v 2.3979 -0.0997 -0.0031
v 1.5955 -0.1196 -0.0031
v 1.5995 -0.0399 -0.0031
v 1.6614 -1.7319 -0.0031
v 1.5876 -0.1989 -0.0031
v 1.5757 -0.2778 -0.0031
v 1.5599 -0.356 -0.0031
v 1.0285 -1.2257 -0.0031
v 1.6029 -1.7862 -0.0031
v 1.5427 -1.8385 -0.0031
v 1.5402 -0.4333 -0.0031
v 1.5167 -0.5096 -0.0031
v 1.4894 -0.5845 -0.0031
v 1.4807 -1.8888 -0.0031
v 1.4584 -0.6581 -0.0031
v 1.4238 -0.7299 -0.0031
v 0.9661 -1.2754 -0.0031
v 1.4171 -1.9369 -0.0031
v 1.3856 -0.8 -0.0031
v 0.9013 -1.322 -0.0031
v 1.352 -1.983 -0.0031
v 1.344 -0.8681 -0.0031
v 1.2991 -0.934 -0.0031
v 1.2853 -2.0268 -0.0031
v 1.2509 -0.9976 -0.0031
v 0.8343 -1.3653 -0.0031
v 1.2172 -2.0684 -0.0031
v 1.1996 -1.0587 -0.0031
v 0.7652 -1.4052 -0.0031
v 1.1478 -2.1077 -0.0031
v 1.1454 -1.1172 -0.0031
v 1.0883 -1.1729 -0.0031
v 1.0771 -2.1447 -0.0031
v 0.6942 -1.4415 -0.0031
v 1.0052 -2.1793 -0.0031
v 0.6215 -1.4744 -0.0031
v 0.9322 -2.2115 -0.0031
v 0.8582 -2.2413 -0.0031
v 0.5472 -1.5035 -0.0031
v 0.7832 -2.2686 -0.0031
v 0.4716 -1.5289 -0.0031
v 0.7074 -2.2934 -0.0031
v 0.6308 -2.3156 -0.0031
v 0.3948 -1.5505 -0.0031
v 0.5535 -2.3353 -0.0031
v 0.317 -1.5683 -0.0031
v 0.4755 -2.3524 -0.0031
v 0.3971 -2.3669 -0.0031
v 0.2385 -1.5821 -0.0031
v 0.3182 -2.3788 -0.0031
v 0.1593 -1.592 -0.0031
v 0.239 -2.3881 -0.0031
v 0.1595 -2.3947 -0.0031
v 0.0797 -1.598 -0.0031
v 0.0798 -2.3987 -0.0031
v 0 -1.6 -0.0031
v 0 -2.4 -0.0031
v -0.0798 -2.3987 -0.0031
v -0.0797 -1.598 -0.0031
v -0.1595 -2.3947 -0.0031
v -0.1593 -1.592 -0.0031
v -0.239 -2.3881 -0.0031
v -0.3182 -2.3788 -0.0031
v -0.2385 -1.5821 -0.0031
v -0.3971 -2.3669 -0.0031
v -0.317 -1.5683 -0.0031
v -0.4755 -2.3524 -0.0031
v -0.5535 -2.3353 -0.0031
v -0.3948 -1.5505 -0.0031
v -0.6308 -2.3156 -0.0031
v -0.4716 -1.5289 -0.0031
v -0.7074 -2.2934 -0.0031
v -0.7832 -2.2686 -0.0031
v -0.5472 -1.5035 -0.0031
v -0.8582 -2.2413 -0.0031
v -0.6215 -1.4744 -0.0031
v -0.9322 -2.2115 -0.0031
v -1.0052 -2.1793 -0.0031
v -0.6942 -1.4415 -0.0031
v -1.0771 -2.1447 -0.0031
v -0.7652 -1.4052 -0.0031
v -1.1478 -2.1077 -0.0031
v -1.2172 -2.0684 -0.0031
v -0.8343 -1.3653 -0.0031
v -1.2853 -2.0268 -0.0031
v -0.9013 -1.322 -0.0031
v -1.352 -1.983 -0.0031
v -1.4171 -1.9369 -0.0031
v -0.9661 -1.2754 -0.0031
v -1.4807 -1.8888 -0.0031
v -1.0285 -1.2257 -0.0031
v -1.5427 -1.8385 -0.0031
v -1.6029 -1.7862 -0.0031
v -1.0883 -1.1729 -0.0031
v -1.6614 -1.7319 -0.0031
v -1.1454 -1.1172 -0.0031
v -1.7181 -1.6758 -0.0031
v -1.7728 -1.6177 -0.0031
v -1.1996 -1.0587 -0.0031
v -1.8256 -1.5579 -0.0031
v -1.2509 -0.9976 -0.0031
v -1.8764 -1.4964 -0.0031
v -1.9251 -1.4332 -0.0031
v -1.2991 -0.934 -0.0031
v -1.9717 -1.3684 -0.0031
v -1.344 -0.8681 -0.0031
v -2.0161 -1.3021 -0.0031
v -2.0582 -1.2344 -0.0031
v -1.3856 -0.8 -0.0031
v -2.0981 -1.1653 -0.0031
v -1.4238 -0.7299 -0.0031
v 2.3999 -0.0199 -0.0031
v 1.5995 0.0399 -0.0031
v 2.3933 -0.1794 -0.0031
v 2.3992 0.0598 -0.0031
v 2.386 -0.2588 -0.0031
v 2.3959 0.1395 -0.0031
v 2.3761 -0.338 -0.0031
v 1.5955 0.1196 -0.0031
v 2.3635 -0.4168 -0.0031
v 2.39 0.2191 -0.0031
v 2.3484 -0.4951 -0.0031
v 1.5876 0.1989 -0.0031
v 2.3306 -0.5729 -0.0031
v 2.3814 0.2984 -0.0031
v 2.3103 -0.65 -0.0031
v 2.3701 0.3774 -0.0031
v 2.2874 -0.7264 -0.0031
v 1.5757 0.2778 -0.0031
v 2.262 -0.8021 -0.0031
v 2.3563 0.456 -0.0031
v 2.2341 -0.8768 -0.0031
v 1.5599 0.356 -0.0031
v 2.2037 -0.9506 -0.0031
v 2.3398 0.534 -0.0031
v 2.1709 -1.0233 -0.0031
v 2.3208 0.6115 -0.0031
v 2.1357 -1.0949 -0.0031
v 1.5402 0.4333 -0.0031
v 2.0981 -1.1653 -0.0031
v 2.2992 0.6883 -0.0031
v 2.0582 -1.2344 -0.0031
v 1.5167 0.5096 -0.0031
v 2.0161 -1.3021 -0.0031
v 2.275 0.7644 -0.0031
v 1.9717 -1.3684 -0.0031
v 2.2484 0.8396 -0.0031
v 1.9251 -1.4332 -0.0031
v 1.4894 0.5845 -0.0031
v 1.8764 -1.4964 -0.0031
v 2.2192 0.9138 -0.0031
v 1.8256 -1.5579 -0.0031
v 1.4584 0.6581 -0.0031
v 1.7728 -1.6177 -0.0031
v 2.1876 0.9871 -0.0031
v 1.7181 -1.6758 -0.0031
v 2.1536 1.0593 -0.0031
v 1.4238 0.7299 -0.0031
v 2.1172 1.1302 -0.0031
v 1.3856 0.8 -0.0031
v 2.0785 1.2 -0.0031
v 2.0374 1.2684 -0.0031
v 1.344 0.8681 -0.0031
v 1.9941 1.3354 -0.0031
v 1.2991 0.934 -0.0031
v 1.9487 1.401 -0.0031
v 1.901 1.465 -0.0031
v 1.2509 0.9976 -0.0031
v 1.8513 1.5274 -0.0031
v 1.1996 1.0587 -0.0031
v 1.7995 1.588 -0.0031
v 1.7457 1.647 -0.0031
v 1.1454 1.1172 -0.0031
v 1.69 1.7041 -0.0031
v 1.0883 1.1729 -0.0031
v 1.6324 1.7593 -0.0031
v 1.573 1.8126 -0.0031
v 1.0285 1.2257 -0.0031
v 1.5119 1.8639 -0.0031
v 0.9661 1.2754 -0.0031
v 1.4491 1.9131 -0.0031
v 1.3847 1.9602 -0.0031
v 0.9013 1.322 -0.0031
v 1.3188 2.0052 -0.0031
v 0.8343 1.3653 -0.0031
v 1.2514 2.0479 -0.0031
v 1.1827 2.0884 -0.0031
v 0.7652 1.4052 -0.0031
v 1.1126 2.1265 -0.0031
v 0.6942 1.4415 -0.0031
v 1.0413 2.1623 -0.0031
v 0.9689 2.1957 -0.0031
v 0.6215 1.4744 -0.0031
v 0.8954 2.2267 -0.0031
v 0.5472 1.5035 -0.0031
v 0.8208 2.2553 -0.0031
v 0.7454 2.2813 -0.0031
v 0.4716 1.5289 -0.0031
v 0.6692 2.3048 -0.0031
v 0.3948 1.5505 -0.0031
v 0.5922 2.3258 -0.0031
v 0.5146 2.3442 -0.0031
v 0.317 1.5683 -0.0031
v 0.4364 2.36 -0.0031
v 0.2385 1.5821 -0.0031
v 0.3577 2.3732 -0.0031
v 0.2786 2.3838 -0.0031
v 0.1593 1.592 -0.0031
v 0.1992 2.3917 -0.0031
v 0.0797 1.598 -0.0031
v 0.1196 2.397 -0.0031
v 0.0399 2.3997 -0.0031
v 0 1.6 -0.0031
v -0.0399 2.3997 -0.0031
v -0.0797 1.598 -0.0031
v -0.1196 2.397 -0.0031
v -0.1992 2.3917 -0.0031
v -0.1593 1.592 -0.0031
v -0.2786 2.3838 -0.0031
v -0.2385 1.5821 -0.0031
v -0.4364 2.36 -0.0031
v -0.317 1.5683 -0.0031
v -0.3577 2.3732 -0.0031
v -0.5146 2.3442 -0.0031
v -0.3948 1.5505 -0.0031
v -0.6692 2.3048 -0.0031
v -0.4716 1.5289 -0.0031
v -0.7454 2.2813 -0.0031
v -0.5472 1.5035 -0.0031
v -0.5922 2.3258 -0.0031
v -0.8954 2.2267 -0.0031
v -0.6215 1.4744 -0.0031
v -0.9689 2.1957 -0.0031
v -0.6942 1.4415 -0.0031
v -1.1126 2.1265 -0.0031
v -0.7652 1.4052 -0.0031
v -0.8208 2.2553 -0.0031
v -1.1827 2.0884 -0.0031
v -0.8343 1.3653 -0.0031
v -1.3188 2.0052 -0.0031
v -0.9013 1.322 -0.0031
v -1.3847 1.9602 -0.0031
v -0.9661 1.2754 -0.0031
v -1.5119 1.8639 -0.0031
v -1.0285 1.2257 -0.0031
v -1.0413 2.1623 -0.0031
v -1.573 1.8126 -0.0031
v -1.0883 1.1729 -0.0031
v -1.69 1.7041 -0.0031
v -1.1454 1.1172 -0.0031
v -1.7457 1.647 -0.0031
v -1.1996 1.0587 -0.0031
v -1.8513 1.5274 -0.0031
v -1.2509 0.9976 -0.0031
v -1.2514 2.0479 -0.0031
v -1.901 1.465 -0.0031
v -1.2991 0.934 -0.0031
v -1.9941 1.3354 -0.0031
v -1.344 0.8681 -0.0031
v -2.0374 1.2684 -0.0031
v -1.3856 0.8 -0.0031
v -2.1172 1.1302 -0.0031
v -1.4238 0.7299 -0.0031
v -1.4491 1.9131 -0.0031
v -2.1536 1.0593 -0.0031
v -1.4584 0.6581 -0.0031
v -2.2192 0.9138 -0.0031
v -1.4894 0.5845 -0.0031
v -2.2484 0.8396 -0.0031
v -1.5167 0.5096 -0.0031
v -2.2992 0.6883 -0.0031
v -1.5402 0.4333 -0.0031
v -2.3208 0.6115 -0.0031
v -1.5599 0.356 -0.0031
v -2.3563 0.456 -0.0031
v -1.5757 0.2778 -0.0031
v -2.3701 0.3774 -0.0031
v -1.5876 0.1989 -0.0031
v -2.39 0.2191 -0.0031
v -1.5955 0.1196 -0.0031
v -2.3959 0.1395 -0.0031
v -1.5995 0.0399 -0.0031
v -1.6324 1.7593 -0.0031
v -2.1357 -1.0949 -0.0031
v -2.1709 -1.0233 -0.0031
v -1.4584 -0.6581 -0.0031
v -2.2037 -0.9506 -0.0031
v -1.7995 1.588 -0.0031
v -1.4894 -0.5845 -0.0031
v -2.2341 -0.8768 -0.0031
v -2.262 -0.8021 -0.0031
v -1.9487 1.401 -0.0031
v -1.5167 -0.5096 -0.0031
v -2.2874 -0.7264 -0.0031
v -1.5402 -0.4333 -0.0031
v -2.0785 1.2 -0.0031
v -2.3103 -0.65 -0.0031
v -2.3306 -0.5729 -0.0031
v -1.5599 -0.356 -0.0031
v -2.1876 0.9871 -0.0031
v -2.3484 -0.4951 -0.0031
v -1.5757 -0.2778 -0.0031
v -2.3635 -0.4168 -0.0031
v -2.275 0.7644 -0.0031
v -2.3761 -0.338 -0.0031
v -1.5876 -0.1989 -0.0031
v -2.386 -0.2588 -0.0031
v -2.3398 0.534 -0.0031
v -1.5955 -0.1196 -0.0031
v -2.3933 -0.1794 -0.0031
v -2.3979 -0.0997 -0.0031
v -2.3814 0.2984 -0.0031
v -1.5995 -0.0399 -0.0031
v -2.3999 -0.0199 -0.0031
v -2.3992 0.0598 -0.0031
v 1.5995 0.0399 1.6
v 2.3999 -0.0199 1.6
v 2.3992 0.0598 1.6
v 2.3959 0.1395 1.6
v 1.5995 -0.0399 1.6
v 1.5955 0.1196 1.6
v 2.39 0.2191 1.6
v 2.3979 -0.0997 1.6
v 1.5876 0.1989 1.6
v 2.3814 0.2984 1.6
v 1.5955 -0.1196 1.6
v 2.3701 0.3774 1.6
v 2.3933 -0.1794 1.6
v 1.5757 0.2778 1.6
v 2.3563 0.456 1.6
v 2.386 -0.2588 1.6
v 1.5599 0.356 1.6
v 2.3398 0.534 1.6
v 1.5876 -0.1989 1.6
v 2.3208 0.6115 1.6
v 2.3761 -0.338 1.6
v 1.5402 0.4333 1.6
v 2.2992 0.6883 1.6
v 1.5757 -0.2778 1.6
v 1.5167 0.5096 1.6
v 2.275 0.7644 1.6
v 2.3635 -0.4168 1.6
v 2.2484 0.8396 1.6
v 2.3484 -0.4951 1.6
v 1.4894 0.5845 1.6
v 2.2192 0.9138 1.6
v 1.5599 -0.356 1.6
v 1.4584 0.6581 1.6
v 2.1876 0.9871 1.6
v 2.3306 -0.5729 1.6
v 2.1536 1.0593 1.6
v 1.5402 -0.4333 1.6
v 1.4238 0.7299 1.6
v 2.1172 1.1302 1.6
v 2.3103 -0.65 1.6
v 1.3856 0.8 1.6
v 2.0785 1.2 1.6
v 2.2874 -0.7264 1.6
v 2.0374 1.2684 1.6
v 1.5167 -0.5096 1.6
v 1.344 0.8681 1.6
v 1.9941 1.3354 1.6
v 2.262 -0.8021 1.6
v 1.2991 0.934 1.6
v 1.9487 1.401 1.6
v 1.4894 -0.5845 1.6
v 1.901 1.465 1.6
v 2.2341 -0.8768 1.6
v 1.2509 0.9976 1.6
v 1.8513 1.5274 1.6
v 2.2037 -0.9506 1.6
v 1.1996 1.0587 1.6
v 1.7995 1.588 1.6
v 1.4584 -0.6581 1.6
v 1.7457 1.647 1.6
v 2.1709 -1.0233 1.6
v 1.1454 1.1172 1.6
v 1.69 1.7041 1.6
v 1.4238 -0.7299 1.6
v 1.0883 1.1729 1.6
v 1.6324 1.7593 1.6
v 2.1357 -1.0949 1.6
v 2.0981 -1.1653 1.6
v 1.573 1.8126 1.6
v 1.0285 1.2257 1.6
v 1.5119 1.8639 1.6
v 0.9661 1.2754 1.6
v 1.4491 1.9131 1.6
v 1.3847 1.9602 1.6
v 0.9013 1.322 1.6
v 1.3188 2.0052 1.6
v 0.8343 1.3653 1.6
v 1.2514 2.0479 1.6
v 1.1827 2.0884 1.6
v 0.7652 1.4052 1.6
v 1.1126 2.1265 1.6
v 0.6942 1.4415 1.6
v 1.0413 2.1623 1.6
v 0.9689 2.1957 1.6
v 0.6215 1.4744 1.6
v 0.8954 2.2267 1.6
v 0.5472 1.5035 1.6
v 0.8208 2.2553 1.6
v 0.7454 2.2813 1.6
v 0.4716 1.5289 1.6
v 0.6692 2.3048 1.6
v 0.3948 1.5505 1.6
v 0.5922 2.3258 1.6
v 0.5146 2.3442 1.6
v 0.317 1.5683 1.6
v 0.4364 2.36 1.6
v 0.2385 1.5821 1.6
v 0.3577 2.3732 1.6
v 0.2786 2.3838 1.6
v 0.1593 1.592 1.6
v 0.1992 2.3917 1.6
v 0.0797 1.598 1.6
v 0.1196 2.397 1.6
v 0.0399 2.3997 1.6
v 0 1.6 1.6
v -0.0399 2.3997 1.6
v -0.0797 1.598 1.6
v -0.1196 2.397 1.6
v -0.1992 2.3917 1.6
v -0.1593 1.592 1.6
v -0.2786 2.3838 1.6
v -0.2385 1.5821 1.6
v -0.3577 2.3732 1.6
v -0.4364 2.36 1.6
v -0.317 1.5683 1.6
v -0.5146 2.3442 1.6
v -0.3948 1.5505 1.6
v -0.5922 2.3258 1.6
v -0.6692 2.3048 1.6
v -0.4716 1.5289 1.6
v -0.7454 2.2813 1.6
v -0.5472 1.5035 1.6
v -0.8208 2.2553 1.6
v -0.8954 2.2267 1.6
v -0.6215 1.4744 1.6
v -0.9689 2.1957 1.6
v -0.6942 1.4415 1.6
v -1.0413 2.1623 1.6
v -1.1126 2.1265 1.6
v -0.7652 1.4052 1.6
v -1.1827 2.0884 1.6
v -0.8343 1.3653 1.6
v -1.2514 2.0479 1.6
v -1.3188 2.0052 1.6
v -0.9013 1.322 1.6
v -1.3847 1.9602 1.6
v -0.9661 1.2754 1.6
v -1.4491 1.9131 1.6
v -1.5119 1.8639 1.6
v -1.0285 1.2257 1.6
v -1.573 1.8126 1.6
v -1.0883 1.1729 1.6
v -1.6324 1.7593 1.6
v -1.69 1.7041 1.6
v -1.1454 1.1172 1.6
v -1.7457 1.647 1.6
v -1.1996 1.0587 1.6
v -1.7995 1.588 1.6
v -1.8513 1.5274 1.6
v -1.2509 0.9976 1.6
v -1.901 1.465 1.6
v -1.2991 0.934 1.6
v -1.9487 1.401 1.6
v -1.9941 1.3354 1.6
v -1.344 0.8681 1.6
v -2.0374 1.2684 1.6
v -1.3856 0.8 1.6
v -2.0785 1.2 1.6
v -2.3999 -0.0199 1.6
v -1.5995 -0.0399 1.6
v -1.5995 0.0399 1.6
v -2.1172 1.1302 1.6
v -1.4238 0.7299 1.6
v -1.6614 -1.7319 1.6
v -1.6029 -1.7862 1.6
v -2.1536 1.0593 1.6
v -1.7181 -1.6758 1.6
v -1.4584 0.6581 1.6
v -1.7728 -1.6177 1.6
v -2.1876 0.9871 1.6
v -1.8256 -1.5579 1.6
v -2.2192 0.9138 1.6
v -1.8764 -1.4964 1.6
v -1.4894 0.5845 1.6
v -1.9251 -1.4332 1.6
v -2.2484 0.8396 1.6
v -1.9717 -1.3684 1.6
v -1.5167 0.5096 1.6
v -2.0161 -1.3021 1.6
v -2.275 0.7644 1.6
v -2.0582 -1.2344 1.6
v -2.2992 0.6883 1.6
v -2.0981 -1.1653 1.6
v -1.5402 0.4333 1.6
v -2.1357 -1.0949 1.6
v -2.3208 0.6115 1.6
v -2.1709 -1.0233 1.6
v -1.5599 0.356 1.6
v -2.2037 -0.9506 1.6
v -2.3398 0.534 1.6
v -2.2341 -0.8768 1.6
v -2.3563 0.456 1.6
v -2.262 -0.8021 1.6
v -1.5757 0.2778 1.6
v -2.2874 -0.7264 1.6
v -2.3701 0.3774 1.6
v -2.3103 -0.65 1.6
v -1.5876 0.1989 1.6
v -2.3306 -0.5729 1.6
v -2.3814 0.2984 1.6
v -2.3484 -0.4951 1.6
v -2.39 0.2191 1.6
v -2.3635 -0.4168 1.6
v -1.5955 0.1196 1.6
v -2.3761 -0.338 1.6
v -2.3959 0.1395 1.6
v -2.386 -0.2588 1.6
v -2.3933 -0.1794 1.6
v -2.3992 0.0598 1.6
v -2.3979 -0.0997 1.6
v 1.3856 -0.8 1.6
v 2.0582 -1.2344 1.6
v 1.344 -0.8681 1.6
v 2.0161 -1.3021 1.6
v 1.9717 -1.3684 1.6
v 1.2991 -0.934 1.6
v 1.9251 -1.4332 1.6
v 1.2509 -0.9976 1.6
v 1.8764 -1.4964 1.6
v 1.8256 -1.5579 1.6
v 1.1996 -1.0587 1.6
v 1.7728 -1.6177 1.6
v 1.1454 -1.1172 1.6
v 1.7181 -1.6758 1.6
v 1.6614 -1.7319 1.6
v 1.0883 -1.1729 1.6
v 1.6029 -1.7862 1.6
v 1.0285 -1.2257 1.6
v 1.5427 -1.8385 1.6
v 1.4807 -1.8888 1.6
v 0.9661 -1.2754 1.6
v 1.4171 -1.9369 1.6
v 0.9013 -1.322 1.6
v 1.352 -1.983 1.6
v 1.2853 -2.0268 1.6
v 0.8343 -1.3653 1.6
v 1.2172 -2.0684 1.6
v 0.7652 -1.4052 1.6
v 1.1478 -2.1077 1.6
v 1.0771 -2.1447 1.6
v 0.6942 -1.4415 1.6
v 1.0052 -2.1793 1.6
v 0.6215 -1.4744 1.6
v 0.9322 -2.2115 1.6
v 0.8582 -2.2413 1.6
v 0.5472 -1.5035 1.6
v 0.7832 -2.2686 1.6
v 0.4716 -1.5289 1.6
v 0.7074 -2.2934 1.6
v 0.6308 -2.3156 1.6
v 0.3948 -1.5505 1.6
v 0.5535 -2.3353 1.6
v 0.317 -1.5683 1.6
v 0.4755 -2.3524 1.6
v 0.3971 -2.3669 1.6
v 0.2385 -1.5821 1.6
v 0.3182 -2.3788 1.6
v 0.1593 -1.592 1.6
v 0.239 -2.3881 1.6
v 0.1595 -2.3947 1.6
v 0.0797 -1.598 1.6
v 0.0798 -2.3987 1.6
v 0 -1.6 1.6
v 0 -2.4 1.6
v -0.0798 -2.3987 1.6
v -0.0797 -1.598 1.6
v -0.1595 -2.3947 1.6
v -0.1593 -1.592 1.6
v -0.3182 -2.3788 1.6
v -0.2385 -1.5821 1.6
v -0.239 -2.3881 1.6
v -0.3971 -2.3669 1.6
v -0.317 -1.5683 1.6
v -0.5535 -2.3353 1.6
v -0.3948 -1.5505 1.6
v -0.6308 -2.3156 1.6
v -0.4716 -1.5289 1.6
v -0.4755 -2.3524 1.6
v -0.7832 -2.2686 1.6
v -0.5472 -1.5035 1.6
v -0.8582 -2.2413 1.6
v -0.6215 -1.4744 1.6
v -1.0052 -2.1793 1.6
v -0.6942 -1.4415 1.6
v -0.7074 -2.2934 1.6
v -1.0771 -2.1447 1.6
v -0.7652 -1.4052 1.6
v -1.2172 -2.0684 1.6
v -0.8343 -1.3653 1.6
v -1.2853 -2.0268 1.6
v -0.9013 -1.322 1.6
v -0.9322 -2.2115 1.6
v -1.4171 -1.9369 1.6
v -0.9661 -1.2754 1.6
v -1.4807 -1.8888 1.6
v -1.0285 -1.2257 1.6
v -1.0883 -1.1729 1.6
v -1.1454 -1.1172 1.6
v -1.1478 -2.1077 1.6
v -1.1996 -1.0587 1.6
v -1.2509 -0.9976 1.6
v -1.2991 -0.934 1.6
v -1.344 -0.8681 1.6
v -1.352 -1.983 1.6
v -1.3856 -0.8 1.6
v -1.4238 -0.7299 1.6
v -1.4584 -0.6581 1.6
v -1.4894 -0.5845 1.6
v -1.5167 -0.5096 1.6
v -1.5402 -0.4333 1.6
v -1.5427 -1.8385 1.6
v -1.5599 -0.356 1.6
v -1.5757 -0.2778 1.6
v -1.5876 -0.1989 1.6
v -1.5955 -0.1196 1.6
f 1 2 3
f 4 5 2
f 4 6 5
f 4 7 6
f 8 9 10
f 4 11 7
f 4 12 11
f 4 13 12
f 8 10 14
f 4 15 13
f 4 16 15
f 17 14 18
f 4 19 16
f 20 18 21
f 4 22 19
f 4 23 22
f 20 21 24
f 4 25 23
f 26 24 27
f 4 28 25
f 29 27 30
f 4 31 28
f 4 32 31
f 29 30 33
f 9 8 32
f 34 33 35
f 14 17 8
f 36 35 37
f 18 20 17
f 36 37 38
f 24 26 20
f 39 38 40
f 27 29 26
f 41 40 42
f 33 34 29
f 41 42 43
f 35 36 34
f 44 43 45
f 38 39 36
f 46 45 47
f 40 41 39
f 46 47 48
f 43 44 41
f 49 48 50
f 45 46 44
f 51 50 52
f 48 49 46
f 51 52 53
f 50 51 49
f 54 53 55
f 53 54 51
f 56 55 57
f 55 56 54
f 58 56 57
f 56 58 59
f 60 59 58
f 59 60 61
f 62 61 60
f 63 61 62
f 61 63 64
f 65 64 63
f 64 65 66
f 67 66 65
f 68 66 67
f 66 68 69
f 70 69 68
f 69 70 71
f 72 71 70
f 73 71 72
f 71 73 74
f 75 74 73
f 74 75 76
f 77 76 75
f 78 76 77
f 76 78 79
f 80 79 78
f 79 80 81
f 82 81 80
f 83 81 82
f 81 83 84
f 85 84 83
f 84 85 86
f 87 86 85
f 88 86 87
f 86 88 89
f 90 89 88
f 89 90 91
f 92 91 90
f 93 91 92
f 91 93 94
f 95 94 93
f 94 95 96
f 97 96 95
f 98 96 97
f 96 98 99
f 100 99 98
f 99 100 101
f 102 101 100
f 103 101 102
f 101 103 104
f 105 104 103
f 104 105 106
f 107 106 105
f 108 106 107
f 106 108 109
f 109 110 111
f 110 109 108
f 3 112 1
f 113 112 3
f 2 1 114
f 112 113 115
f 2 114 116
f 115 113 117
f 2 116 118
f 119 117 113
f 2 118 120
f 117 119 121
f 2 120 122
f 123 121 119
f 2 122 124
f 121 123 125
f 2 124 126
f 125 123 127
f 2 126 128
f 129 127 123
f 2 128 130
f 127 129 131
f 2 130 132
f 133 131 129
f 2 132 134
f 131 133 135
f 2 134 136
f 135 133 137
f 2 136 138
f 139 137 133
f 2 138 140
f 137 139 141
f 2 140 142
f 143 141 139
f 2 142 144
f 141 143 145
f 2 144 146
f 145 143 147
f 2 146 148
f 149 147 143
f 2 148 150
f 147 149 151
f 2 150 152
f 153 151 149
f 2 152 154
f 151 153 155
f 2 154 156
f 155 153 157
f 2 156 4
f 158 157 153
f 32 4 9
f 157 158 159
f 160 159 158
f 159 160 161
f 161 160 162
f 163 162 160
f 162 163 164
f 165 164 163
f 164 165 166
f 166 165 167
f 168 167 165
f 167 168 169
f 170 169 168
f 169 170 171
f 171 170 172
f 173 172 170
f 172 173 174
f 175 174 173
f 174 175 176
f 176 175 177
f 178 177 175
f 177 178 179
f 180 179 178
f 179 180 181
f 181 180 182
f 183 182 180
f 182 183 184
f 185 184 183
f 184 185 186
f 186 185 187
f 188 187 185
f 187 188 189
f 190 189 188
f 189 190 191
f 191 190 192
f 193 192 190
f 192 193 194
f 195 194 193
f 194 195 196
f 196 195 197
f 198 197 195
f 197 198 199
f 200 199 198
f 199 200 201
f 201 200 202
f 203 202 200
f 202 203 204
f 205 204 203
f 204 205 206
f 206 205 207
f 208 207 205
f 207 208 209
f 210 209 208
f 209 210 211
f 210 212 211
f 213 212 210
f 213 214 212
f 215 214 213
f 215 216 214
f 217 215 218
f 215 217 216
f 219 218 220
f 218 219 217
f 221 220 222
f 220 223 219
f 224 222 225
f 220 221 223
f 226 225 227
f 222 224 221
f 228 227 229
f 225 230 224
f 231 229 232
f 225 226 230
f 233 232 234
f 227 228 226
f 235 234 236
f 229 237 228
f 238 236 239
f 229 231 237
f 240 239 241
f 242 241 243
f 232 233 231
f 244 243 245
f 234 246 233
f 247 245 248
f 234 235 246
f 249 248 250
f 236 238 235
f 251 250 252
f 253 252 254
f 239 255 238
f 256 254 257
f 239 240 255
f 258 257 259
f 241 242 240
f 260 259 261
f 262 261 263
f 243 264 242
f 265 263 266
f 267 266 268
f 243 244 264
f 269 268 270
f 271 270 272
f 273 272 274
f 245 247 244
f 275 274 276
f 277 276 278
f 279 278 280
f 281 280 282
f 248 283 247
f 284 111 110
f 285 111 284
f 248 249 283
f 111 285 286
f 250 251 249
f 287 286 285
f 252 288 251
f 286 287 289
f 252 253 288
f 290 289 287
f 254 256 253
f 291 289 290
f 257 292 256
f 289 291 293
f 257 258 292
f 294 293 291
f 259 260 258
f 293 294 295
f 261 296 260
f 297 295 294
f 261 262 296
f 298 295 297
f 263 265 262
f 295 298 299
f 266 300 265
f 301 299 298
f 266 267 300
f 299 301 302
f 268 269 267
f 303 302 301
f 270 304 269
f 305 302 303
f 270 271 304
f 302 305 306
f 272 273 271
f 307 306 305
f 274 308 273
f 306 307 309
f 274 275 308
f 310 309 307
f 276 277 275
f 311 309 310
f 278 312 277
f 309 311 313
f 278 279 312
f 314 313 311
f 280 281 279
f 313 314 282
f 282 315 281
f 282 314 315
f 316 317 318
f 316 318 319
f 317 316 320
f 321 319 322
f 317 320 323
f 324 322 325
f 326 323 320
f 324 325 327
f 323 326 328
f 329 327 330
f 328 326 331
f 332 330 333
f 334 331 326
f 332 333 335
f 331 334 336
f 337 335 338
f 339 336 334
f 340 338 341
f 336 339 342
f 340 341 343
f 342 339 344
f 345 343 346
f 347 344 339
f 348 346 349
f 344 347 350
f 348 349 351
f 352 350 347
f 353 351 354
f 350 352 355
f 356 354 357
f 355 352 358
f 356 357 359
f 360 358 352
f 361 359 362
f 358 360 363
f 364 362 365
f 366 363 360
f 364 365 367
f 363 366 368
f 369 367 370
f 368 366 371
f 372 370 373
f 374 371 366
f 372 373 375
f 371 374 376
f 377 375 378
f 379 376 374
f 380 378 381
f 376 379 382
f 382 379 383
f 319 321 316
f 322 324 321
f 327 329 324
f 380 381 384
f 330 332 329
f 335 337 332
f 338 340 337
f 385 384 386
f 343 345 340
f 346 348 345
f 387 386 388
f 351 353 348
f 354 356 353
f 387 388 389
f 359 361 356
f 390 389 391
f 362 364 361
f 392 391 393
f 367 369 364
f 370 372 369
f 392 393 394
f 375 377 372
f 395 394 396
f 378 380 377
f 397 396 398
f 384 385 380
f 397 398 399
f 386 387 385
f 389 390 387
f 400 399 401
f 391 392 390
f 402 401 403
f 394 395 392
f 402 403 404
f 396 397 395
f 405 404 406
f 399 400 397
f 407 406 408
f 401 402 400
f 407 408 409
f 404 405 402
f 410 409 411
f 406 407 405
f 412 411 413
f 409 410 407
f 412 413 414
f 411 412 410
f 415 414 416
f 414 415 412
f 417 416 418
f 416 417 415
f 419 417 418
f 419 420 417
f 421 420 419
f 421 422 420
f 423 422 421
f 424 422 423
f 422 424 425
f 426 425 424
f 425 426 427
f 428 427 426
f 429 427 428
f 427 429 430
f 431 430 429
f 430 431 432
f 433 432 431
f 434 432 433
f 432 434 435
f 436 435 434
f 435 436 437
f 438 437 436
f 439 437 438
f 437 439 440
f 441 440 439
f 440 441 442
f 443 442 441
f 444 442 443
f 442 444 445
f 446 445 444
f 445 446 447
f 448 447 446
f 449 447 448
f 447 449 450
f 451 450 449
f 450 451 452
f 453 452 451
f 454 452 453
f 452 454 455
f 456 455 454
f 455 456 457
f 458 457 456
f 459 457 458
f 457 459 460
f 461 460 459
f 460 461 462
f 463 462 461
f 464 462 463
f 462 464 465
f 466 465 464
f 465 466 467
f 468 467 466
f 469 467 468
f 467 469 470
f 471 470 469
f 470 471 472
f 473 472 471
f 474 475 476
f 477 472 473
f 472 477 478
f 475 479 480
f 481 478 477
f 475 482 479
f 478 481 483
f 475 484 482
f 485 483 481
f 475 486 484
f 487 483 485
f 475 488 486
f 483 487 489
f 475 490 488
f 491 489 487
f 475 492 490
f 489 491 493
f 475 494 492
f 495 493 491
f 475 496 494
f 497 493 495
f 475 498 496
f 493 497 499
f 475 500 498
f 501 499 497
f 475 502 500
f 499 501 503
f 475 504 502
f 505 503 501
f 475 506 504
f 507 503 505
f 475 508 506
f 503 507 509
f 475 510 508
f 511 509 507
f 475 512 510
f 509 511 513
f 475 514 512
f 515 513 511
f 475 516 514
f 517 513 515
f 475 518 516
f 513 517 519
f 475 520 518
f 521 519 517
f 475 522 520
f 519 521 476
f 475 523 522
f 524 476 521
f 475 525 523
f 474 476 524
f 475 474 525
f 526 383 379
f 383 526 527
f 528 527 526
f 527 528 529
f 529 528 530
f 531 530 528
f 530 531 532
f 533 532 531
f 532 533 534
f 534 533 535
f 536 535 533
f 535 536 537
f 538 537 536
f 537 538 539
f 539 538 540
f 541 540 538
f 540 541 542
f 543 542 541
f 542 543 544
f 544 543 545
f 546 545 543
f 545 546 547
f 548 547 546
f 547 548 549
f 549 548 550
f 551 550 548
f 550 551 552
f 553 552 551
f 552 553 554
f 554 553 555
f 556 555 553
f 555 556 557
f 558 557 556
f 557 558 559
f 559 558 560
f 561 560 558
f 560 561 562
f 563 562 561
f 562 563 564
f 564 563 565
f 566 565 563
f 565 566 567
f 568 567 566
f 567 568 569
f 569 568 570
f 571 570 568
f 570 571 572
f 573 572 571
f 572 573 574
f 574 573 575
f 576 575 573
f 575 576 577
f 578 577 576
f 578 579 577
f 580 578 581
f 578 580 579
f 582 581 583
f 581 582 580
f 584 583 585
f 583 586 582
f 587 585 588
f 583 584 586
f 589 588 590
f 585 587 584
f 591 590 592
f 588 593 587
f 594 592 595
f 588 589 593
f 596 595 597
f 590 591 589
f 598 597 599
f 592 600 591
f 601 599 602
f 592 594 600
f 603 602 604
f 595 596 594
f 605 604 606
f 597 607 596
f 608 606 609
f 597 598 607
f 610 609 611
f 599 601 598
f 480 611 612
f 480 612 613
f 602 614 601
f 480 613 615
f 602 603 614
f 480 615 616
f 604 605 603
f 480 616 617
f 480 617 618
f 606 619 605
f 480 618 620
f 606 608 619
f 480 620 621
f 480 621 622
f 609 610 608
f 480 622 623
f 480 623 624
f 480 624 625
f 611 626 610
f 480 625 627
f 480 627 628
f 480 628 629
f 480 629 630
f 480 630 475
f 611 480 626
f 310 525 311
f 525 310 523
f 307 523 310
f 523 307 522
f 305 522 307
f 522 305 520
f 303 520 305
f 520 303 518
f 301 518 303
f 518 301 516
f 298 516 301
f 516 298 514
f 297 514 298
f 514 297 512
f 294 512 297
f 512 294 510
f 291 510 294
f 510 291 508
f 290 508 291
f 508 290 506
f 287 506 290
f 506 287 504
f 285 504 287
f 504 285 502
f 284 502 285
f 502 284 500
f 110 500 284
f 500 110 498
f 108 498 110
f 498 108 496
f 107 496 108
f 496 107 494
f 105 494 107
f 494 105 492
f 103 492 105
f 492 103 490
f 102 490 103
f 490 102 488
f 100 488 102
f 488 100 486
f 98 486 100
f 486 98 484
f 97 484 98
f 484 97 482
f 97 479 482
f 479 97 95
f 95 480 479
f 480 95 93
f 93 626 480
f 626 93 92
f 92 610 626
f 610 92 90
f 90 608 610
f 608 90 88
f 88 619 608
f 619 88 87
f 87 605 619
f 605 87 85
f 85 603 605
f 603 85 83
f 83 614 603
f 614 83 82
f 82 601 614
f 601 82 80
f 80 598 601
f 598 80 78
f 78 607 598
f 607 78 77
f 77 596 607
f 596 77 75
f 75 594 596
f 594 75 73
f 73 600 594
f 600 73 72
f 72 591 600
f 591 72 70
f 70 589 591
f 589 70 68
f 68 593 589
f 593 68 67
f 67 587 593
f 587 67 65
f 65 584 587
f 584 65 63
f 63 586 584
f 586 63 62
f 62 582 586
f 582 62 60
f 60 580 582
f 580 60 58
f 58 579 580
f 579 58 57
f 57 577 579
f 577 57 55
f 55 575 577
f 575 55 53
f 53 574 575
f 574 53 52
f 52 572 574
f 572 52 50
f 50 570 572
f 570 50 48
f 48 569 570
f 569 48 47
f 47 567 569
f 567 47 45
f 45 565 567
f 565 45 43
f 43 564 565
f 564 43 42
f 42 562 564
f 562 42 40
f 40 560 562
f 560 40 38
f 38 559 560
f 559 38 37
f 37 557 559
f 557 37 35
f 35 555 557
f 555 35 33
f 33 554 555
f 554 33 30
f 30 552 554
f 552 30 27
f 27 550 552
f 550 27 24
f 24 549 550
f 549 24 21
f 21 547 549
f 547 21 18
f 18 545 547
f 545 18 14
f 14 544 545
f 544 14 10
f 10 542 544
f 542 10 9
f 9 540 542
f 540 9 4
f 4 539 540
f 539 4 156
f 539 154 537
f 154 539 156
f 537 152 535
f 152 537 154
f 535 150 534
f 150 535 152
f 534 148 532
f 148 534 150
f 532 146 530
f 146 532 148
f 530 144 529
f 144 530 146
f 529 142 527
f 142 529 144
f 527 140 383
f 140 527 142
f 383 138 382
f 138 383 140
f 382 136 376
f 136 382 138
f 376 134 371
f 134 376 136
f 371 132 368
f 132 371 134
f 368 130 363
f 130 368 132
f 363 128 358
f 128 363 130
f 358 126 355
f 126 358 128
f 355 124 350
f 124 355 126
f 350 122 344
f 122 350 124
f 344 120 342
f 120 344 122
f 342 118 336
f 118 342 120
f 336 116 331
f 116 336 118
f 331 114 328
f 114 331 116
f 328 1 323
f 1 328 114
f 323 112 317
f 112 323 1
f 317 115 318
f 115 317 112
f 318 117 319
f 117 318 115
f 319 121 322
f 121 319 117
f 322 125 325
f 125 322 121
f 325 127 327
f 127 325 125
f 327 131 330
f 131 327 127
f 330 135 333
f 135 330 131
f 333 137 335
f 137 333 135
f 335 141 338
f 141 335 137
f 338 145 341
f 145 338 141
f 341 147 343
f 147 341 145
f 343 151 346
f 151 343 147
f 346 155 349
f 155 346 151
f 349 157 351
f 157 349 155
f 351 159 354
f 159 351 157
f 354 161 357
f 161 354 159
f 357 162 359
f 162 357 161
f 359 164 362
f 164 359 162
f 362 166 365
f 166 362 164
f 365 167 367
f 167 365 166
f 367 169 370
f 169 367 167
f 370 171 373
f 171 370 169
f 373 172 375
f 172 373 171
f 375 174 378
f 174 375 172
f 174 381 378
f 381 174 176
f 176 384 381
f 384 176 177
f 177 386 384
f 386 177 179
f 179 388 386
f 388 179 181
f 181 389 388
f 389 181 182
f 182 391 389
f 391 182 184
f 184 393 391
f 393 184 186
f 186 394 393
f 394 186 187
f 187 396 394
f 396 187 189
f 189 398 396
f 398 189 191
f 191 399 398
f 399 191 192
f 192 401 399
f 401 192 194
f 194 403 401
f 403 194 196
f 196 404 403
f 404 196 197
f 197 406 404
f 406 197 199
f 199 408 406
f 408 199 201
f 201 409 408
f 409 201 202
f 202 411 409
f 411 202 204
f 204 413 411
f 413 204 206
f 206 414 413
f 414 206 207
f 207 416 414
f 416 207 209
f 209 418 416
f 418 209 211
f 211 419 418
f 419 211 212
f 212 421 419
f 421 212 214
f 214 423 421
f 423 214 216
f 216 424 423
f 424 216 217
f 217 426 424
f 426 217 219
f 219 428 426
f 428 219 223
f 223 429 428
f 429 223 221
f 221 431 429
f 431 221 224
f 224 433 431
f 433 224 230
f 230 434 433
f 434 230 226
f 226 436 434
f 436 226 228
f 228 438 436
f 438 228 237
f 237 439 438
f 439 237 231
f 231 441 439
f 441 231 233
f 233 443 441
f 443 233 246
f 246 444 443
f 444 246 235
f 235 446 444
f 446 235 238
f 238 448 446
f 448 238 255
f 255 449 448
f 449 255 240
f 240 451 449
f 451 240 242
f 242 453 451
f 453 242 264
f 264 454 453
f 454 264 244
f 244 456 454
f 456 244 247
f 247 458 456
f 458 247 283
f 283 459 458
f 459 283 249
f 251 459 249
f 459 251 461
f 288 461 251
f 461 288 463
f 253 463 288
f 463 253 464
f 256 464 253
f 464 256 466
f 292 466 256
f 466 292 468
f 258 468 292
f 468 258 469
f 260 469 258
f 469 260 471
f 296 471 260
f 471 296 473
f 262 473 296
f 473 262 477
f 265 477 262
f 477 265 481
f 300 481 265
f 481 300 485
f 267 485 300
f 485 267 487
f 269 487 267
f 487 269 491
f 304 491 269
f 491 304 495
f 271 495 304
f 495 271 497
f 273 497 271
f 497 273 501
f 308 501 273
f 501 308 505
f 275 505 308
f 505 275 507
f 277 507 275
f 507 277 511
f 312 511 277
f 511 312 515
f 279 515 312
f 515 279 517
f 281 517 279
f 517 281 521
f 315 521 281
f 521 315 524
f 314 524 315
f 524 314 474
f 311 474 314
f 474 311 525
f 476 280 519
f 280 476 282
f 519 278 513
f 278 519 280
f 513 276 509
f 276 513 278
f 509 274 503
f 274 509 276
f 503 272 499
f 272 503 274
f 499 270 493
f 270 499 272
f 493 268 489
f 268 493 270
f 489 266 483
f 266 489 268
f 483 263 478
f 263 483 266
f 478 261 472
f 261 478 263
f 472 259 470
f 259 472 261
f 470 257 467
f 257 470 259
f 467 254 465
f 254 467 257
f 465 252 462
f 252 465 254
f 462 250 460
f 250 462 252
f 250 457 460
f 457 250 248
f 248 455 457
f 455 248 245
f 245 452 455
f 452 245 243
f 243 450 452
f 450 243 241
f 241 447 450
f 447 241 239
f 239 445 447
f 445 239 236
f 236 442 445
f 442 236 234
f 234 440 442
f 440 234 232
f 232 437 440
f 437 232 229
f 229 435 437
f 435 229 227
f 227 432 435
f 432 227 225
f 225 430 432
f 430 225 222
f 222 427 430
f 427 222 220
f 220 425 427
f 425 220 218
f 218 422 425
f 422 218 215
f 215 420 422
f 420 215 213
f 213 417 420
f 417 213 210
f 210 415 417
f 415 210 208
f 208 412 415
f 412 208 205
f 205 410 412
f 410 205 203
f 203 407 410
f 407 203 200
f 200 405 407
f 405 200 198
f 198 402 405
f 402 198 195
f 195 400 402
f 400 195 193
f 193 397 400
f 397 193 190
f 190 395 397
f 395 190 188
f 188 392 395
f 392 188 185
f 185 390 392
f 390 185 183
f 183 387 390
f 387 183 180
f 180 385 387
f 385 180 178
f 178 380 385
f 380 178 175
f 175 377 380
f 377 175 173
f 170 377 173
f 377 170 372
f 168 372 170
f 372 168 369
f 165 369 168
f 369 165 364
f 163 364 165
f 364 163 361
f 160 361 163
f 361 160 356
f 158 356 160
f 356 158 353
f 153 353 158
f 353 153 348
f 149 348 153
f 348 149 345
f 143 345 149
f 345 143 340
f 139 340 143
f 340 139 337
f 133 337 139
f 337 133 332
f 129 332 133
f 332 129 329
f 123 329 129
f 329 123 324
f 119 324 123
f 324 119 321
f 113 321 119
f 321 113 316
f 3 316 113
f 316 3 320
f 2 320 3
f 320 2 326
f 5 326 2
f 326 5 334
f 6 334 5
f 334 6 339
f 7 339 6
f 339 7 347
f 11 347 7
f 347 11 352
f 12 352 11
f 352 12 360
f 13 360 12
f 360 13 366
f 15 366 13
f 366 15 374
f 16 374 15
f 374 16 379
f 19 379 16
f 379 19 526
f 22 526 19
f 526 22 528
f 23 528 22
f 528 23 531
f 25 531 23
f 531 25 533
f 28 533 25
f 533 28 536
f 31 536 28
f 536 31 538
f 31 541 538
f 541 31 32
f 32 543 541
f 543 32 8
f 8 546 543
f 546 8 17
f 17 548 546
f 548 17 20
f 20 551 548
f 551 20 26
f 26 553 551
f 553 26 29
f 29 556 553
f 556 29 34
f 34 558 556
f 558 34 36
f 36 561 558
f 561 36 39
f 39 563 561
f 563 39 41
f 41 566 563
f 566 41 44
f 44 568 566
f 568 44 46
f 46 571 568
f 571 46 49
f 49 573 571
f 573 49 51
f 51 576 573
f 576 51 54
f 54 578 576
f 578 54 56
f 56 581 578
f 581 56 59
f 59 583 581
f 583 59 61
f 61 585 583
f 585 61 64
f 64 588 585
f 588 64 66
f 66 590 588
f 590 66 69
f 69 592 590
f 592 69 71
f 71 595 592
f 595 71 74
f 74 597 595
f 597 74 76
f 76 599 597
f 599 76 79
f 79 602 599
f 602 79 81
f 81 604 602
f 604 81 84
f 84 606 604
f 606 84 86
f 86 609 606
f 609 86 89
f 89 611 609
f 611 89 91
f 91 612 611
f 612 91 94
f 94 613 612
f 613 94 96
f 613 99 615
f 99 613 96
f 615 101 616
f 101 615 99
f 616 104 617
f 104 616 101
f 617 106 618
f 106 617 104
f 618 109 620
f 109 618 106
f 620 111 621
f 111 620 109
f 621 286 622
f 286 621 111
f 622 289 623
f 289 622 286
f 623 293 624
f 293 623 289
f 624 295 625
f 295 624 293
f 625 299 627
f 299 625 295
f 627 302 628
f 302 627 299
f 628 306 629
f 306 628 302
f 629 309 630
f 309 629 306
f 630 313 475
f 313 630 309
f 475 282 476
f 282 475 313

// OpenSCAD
use <../lib.scad>
use <../p/4-4cyli.scad>
use <../p/4-4disc.scad>
use <../p/4-4edge.scad>
use <../p/h2.scad>
use <../p/stud2.scad>
use <../p/t04o3333.scad>
$fa=1; $fs=0.2;
function ldraw_lib__2433(realsolid=false) = [
// 0 Hinge Bar  2 with 3 Fingers and Top Stud
// 0 Name: 2433.dat
// 0 Author: James Jessiman
// 0 !LDRAW_ORG Part UPDATE 2004-04
// 0 !LICENSE Licensed under CC BY 2.0 and CC BY 4.0 : see CAreadme.txt
// 
// 0 BFC CERTIFY CCW
  [0,"BFC","CERTIFY"],
  [0,"BFC","CCW"],
// 
// 0 !KEYWORDS control, controls, finger, gear shift, lever, rod, rod system
// 
// 0 !HISTORY 1998-06-20 [PTadmin] Official Update 1998-06
// 0 !HISTORY 2003-06-08 [jriley] BFC compliant
// 0 !HISTORY 2003-11-20 [OrionP] added ridges; fixed L3P errors
// 0 !HISTORY 2003-11-20 [fwcain] added some keywords...
// 0 !HISTORY 2004-11-06 [PTadmin] Official Update 2004-04
// 0 !HISTORY 2007-05-08 [PTadmin] Header formatted for Contributor Agreement
// 0 !HISTORY 2008-07-01 [PTadmin] Official Update 2008-01
// 
// 
// 1 16 0 0 0 1 0 0 0 1 0 0 0 1 stud2.dat
  [1,16,0,0,0,1,0,0,0,1,0,0,0,1, ldraw_lib__stud2(realsolid)],
// 1 16 0 26 0 1 0 0 0 1 0 0 0 1 h2.dat
  [1,16,0,26,0,1,0,0,0,1,0,0,0,1, ldraw_lib__h2(realsolid)],
// 2 24 4 26 10 -4 26 10
  [2,24,4,26,10,-4,26,10],
// 2 24 -4 26 10 -4 26 -10
  [2,24,-4,26,10,-4,26,-10],
// 2 24 -4 26 -10 4 26 -10
  [2,24,-4,26,-10,4,26,-10],
// 2 24 4 26 -10 4 26 10
  [2,24,4,26,-10,4,26,10],
// 1 16 0 26 0 4 0 0 0 1 0 0 0 4 4-4edge.dat
  [1,16,0,26,0,4,0,0,0,1,0,0,0,4, ldraw_lib__4_4edge(realsolid)],
// 1 16 0 4 0 4 0 0 0 1 0 0 0 4 4-4edge.dat
  [1,16,0,4,0,4,0,0,0,1,0,0,0,4, ldraw_lib__4_4edge(realsolid)],
// 1 16 0 4 0 8 0 0 0 1 0 0 0 8 4-4edge.dat
  [1,16,0,4,0,8,0,0,0,1,0,0,0,8, ldraw_lib__4_4edge(realsolid)],
// 1 16 0 0 0 8 0 0 0 1 0 0 0 8 4-4edge.dat
  [1,16,0,0,0,8,0,0,0,1,0,0,0,8, ldraw_lib__4_4edge(realsolid)],
// 4 16 4 26 -10 4 26 10 -4 26 10 -4 26 -10
  [4,16,4,26,-10,4,26,10,-4,26,10,-4,26,-10],
// 1 16 0 4 0 4 0 0 0 8 0 0 0 4 4-4cyli.dat
  [1,16,0,4,0,4,0,0,0,8,0,0,0,4, ldraw_lib__4_4cyli(realsolid)],
// 1 16 0 20 0 4 0 0 0 6 0 0 0 4 4-4cyli.dat
  [1,16,0,20,0,4,0,0,0,6,0,0,0,4, ldraw_lib__4_4cyli(realsolid)],
// 1 16 0 4 0 8 0 0 0 -1 0 0 0 -8 4-4disc.dat
  [1,16,0,4,0,8,0,0,0,-1,0,0,0,-8, ldraw_lib__4_4disc(realsolid)],
// 1 16 0 0 0 8 0 0 0 4 0 0 0 8 4-4cyli.dat
  [1,16,0,0,0,8,0,0,0,4,0,0,0,8, ldraw_lib__4_4cyli(realsolid)],
// 1 16 0 0 0 8 0 0 0 1 0 0 0 8 4-4disc.dat
  [1,16,0,0,0,8,0,0,0,1,0,0,0,8, ldraw_lib__4_4disc(realsolid)],
// 1 16 0 12 0 3 0 0 0 3 0 0 0 -3 t04o3333.dat
  [1,16,0,12,0,3,0,0,0,3,0,0,0,-3, ldraw_lib__t04o3333(realsolid)],
// 1 16 0 12 0 0 0 3 0 3 0 3 0 0 t04o3333.dat
  [1,16,0,12,0,0,0,3,0,3,0,3,0,0, ldraw_lib__t04o3333(realsolid)],
// 1 16 0 12 0 -3 0 0 0 3 0 0 0 3 t04o3333.dat
  [1,16,0,12,0,-3,0,0,0,3,0,0,0,3, ldraw_lib__t04o3333(realsolid)],
// 1 16 0 12 0 0 0 -3 0 3 0 -3 0 0 t04o3333.dat
  [1,16,0,12,0,0,0,-3,0,3,0,-3,0,0, ldraw_lib__t04o3333(realsolid)],
// 1 16 0 14 0 -3 0 0 0 -3 0 0 0 -3 t04o3333.dat
  [1,16,0,14,0,-3,0,0,0,-3,0,0,0,-3, ldraw_lib__t04o3333(realsolid)],
// 1 16 0 14 0 0 0 -3 0 -3 0 3 0 0 t04o3333.dat
  [1,16,0,14,0,0,0,-3,0,-3,0,3,0,0, ldraw_lib__t04o3333(realsolid)],
// 1 16 0 14 0 3 0 0 0 -3 0 0 0 3 t04o3333.dat
  [1,16,0,14,0,3,0,0,0,-3,0,0,0,3, ldraw_lib__t04o3333(realsolid)],
// 1 16 0 14 0 0 0 3 0 -3 0 -3 0 0 t04o3333.dat
  [1,16,0,14,0,0,0,3,0,-3,0,-3,0,0, ldraw_lib__t04o3333(realsolid)],
// 1 16 0 13 0 3 0 0 0 1 0 0 0 -3 4-4edge.dat
  [1,16,0,13,0,3,0,0,0,1,0,0,0,-3, ldraw_lib__4_4edge(realsolid)],
// 1 16 0 14 0 3 0 0 0 3 0 0 0 -3 t04o3333.dat
  [1,16,0,14,0,3,0,0,0,3,0,0,0,-3, ldraw_lib__t04o3333(realsolid)],
// 1 16 0 14 0 0 0 3 0 3 0 3 0 0 t04o3333.dat
  [1,16,0,14,0,0,0,3,0,3,0,3,0,0, ldraw_lib__t04o3333(realsolid)],
// 1 16 0 14 0 -3 0 0 0 3 0 0 0 3 t04o3333.dat
  [1,16,0,14,0,-3,0,0,0,3,0,0,0,3, ldraw_lib__t04o3333(realsolid)],
// 1 16 0 14 0 0 0 -3 0 3 0 -3 0 0 t04o3333.dat
  [1,16,0,14,0,0,0,-3,0,3,0,-3,0,0, ldraw_lib__t04o3333(realsolid)],
// 1 16 0 16 0 -3 0 0 0 -3 0 0 0 -3 t04o3333.dat
  [1,16,0,16,0,-3,0,0,0,-3,0,0,0,-3, ldraw_lib__t04o3333(realsolid)],
// 1 16 0 16 0 0 0 -3 0 -3 0 3 0 0 t04o3333.dat
  [1,16,0,16,0,0,0,-3,0,-3,0,3,0,0, ldraw_lib__t04o3333(realsolid)],
// 1 16 0 16 0 3 0 0 0 -3 0 0 0 3 t04o3333.dat
  [1,16,0,16,0,3,0,0,0,-3,0,0,0,3, ldraw_lib__t04o3333(realsolid)],
// 1 16 0 16 0 0 0 3 0 -3 0 -3 0 0 t04o3333.dat
  [1,16,0,16,0,0,0,3,0,-3,0,-3,0,0, ldraw_lib__t04o3333(realsolid)],
// 1 16 0 15 0 3 0 0 0 1 0 0 0 -3 4-4edge.dat
  [1,16,0,15,0,3,0,0,0,1,0,0,0,-3, ldraw_lib__4_4edge(realsolid)],
// 1 16 0 16 0 3 0 0 0 3 0 0 0 -3 t04o3333.dat
  [1,16,0,16,0,3,0,0,0,3,0,0,0,-3, ldraw_lib__t04o3333(realsolid)],
// 1 16 0 16 0 0 0 3 0 3 0 3 0 0 t04o3333.dat
  [1,16,0,16,0,0,0,3,0,3,0,3,0,0, ldraw_lib__t04o3333(realsolid)],
// 1 16 0 16 0 -3 0 0 0 3 0 0 0 3 t04o3333.dat
  [1,16,0,16,0,-3,0,0,0,3,0,0,0,3, ldraw_lib__t04o3333(realsolid)],
// 1 16 0 16 0 0 0 -3 0 3 0 -3 0 0 t04o3333.dat
  [1,16,0,16,0,0,0,-3,0,3,0,-3,0,0, ldraw_lib__t04o3333(realsolid)],
// 1 16 0 18 0 -3 0 0 0 -3 0 0 0 -3 t04o3333.dat
  [1,16,0,18,0,-3,0,0,0,-3,0,0,0,-3, ldraw_lib__t04o3333(realsolid)],
// 1 16 0 18 0 0 0 -3 0 -3 0 3 0 0 t04o3333.dat
  [1,16,0,18,0,0,0,-3,0,-3,0,3,0,0, ldraw_lib__t04o3333(realsolid)],
// 1 16 0 18 0 3 0 0 0 -3 0 0 0 3 t04o3333.dat
  [1,16,0,18,0,3,0,0,0,-3,0,0,0,3, ldraw_lib__t04o3333(realsolid)],
// 1 16 0 18 0 0 0 3 0 -3 0 -3 0 0 t04o3333.dat
  [1,16,0,18,0,0,0,3,0,-3,0,-3,0,0, ldraw_lib__t04o3333(realsolid)],
// 1 16 0 17 0 3 0 0 0 1 0 0 0 -3 4-4edge.dat
  [1,16,0,17,0,3,0,0,0,1,0,0,0,-3, ldraw_lib__4_4edge(realsolid)],
// 1 16 0 18 0 3 0 0 0 3 0 0 0 -3 t04o3333.dat
  [1,16,0,18,0,3,0,0,0,3,0,0,0,-3, ldraw_lib__t04o3333(realsolid)],
// 1 16 0 18 0 0 0 3 0 3 0 3 0 0 t04o3333.dat
  [1,16,0,18,0,0,0,3,0,3,0,3,0,0, ldraw_lib__t04o3333(realsolid)],
// 1 16 0 18 0 -3 0 0 0 3 0 0 0 3 t04o3333.dat
  [1,16,0,18,0,-3,0,0,0,3,0,0,0,3, ldraw_lib__t04o3333(realsolid)],
// 1 16 0 18 0 0 0 -3 0 3 0 -3 0 0 t04o3333.dat
  [1,16,0,18,0,0,0,-3,0,3,0,-3,0,0, ldraw_lib__t04o3333(realsolid)],
// 1 16 0 20 0 -3 0 0 0 -3 0 0 0 -3 t04o3333.dat
  [1,16,0,20,0,-3,0,0,0,-3,0,0,0,-3, ldraw_lib__t04o3333(realsolid)],
// 1 16 0 20 0 0 0 -3 0 -3 0 3 0 0 t04o3333.dat
  [1,16,0,20,0,0,0,-3,0,-3,0,3,0,0, ldraw_lib__t04o3333(realsolid)],
// 1 16 0 20 0 3 0 0 0 -3 0 0 0 3 t04o3333.dat
  [1,16,0,20,0,3,0,0,0,-3,0,0,0,3, ldraw_lib__t04o3333(realsolid)],
// 1 16 0 20 0 0 0 3 0 -3 0 -3 0 0 t04o3333.dat
  [1,16,0,20,0,0,0,3,0,-3,0,-3,0,0, ldraw_lib__t04o3333(realsolid)],
// 1 16 0 19 0 3 0 0 0 1 0 0 0 -3 4-4edge.dat
  [1,16,0,19,0,3,0,0,0,1,0,0,0,-3, ldraw_lib__4_4edge(realsolid)],
// 
// 0 end of file
];
module ldraw_lib__2433(step=0, col=false, unit=2/5, alt=false, line=0.2, solid=!$preview)
    makepoly(ldraw_lib__2433(solid), step=step, col=col, unit=unit, alt=alt, line=line, solid=solid);
ldraw_lib__2433(line=0.2);
